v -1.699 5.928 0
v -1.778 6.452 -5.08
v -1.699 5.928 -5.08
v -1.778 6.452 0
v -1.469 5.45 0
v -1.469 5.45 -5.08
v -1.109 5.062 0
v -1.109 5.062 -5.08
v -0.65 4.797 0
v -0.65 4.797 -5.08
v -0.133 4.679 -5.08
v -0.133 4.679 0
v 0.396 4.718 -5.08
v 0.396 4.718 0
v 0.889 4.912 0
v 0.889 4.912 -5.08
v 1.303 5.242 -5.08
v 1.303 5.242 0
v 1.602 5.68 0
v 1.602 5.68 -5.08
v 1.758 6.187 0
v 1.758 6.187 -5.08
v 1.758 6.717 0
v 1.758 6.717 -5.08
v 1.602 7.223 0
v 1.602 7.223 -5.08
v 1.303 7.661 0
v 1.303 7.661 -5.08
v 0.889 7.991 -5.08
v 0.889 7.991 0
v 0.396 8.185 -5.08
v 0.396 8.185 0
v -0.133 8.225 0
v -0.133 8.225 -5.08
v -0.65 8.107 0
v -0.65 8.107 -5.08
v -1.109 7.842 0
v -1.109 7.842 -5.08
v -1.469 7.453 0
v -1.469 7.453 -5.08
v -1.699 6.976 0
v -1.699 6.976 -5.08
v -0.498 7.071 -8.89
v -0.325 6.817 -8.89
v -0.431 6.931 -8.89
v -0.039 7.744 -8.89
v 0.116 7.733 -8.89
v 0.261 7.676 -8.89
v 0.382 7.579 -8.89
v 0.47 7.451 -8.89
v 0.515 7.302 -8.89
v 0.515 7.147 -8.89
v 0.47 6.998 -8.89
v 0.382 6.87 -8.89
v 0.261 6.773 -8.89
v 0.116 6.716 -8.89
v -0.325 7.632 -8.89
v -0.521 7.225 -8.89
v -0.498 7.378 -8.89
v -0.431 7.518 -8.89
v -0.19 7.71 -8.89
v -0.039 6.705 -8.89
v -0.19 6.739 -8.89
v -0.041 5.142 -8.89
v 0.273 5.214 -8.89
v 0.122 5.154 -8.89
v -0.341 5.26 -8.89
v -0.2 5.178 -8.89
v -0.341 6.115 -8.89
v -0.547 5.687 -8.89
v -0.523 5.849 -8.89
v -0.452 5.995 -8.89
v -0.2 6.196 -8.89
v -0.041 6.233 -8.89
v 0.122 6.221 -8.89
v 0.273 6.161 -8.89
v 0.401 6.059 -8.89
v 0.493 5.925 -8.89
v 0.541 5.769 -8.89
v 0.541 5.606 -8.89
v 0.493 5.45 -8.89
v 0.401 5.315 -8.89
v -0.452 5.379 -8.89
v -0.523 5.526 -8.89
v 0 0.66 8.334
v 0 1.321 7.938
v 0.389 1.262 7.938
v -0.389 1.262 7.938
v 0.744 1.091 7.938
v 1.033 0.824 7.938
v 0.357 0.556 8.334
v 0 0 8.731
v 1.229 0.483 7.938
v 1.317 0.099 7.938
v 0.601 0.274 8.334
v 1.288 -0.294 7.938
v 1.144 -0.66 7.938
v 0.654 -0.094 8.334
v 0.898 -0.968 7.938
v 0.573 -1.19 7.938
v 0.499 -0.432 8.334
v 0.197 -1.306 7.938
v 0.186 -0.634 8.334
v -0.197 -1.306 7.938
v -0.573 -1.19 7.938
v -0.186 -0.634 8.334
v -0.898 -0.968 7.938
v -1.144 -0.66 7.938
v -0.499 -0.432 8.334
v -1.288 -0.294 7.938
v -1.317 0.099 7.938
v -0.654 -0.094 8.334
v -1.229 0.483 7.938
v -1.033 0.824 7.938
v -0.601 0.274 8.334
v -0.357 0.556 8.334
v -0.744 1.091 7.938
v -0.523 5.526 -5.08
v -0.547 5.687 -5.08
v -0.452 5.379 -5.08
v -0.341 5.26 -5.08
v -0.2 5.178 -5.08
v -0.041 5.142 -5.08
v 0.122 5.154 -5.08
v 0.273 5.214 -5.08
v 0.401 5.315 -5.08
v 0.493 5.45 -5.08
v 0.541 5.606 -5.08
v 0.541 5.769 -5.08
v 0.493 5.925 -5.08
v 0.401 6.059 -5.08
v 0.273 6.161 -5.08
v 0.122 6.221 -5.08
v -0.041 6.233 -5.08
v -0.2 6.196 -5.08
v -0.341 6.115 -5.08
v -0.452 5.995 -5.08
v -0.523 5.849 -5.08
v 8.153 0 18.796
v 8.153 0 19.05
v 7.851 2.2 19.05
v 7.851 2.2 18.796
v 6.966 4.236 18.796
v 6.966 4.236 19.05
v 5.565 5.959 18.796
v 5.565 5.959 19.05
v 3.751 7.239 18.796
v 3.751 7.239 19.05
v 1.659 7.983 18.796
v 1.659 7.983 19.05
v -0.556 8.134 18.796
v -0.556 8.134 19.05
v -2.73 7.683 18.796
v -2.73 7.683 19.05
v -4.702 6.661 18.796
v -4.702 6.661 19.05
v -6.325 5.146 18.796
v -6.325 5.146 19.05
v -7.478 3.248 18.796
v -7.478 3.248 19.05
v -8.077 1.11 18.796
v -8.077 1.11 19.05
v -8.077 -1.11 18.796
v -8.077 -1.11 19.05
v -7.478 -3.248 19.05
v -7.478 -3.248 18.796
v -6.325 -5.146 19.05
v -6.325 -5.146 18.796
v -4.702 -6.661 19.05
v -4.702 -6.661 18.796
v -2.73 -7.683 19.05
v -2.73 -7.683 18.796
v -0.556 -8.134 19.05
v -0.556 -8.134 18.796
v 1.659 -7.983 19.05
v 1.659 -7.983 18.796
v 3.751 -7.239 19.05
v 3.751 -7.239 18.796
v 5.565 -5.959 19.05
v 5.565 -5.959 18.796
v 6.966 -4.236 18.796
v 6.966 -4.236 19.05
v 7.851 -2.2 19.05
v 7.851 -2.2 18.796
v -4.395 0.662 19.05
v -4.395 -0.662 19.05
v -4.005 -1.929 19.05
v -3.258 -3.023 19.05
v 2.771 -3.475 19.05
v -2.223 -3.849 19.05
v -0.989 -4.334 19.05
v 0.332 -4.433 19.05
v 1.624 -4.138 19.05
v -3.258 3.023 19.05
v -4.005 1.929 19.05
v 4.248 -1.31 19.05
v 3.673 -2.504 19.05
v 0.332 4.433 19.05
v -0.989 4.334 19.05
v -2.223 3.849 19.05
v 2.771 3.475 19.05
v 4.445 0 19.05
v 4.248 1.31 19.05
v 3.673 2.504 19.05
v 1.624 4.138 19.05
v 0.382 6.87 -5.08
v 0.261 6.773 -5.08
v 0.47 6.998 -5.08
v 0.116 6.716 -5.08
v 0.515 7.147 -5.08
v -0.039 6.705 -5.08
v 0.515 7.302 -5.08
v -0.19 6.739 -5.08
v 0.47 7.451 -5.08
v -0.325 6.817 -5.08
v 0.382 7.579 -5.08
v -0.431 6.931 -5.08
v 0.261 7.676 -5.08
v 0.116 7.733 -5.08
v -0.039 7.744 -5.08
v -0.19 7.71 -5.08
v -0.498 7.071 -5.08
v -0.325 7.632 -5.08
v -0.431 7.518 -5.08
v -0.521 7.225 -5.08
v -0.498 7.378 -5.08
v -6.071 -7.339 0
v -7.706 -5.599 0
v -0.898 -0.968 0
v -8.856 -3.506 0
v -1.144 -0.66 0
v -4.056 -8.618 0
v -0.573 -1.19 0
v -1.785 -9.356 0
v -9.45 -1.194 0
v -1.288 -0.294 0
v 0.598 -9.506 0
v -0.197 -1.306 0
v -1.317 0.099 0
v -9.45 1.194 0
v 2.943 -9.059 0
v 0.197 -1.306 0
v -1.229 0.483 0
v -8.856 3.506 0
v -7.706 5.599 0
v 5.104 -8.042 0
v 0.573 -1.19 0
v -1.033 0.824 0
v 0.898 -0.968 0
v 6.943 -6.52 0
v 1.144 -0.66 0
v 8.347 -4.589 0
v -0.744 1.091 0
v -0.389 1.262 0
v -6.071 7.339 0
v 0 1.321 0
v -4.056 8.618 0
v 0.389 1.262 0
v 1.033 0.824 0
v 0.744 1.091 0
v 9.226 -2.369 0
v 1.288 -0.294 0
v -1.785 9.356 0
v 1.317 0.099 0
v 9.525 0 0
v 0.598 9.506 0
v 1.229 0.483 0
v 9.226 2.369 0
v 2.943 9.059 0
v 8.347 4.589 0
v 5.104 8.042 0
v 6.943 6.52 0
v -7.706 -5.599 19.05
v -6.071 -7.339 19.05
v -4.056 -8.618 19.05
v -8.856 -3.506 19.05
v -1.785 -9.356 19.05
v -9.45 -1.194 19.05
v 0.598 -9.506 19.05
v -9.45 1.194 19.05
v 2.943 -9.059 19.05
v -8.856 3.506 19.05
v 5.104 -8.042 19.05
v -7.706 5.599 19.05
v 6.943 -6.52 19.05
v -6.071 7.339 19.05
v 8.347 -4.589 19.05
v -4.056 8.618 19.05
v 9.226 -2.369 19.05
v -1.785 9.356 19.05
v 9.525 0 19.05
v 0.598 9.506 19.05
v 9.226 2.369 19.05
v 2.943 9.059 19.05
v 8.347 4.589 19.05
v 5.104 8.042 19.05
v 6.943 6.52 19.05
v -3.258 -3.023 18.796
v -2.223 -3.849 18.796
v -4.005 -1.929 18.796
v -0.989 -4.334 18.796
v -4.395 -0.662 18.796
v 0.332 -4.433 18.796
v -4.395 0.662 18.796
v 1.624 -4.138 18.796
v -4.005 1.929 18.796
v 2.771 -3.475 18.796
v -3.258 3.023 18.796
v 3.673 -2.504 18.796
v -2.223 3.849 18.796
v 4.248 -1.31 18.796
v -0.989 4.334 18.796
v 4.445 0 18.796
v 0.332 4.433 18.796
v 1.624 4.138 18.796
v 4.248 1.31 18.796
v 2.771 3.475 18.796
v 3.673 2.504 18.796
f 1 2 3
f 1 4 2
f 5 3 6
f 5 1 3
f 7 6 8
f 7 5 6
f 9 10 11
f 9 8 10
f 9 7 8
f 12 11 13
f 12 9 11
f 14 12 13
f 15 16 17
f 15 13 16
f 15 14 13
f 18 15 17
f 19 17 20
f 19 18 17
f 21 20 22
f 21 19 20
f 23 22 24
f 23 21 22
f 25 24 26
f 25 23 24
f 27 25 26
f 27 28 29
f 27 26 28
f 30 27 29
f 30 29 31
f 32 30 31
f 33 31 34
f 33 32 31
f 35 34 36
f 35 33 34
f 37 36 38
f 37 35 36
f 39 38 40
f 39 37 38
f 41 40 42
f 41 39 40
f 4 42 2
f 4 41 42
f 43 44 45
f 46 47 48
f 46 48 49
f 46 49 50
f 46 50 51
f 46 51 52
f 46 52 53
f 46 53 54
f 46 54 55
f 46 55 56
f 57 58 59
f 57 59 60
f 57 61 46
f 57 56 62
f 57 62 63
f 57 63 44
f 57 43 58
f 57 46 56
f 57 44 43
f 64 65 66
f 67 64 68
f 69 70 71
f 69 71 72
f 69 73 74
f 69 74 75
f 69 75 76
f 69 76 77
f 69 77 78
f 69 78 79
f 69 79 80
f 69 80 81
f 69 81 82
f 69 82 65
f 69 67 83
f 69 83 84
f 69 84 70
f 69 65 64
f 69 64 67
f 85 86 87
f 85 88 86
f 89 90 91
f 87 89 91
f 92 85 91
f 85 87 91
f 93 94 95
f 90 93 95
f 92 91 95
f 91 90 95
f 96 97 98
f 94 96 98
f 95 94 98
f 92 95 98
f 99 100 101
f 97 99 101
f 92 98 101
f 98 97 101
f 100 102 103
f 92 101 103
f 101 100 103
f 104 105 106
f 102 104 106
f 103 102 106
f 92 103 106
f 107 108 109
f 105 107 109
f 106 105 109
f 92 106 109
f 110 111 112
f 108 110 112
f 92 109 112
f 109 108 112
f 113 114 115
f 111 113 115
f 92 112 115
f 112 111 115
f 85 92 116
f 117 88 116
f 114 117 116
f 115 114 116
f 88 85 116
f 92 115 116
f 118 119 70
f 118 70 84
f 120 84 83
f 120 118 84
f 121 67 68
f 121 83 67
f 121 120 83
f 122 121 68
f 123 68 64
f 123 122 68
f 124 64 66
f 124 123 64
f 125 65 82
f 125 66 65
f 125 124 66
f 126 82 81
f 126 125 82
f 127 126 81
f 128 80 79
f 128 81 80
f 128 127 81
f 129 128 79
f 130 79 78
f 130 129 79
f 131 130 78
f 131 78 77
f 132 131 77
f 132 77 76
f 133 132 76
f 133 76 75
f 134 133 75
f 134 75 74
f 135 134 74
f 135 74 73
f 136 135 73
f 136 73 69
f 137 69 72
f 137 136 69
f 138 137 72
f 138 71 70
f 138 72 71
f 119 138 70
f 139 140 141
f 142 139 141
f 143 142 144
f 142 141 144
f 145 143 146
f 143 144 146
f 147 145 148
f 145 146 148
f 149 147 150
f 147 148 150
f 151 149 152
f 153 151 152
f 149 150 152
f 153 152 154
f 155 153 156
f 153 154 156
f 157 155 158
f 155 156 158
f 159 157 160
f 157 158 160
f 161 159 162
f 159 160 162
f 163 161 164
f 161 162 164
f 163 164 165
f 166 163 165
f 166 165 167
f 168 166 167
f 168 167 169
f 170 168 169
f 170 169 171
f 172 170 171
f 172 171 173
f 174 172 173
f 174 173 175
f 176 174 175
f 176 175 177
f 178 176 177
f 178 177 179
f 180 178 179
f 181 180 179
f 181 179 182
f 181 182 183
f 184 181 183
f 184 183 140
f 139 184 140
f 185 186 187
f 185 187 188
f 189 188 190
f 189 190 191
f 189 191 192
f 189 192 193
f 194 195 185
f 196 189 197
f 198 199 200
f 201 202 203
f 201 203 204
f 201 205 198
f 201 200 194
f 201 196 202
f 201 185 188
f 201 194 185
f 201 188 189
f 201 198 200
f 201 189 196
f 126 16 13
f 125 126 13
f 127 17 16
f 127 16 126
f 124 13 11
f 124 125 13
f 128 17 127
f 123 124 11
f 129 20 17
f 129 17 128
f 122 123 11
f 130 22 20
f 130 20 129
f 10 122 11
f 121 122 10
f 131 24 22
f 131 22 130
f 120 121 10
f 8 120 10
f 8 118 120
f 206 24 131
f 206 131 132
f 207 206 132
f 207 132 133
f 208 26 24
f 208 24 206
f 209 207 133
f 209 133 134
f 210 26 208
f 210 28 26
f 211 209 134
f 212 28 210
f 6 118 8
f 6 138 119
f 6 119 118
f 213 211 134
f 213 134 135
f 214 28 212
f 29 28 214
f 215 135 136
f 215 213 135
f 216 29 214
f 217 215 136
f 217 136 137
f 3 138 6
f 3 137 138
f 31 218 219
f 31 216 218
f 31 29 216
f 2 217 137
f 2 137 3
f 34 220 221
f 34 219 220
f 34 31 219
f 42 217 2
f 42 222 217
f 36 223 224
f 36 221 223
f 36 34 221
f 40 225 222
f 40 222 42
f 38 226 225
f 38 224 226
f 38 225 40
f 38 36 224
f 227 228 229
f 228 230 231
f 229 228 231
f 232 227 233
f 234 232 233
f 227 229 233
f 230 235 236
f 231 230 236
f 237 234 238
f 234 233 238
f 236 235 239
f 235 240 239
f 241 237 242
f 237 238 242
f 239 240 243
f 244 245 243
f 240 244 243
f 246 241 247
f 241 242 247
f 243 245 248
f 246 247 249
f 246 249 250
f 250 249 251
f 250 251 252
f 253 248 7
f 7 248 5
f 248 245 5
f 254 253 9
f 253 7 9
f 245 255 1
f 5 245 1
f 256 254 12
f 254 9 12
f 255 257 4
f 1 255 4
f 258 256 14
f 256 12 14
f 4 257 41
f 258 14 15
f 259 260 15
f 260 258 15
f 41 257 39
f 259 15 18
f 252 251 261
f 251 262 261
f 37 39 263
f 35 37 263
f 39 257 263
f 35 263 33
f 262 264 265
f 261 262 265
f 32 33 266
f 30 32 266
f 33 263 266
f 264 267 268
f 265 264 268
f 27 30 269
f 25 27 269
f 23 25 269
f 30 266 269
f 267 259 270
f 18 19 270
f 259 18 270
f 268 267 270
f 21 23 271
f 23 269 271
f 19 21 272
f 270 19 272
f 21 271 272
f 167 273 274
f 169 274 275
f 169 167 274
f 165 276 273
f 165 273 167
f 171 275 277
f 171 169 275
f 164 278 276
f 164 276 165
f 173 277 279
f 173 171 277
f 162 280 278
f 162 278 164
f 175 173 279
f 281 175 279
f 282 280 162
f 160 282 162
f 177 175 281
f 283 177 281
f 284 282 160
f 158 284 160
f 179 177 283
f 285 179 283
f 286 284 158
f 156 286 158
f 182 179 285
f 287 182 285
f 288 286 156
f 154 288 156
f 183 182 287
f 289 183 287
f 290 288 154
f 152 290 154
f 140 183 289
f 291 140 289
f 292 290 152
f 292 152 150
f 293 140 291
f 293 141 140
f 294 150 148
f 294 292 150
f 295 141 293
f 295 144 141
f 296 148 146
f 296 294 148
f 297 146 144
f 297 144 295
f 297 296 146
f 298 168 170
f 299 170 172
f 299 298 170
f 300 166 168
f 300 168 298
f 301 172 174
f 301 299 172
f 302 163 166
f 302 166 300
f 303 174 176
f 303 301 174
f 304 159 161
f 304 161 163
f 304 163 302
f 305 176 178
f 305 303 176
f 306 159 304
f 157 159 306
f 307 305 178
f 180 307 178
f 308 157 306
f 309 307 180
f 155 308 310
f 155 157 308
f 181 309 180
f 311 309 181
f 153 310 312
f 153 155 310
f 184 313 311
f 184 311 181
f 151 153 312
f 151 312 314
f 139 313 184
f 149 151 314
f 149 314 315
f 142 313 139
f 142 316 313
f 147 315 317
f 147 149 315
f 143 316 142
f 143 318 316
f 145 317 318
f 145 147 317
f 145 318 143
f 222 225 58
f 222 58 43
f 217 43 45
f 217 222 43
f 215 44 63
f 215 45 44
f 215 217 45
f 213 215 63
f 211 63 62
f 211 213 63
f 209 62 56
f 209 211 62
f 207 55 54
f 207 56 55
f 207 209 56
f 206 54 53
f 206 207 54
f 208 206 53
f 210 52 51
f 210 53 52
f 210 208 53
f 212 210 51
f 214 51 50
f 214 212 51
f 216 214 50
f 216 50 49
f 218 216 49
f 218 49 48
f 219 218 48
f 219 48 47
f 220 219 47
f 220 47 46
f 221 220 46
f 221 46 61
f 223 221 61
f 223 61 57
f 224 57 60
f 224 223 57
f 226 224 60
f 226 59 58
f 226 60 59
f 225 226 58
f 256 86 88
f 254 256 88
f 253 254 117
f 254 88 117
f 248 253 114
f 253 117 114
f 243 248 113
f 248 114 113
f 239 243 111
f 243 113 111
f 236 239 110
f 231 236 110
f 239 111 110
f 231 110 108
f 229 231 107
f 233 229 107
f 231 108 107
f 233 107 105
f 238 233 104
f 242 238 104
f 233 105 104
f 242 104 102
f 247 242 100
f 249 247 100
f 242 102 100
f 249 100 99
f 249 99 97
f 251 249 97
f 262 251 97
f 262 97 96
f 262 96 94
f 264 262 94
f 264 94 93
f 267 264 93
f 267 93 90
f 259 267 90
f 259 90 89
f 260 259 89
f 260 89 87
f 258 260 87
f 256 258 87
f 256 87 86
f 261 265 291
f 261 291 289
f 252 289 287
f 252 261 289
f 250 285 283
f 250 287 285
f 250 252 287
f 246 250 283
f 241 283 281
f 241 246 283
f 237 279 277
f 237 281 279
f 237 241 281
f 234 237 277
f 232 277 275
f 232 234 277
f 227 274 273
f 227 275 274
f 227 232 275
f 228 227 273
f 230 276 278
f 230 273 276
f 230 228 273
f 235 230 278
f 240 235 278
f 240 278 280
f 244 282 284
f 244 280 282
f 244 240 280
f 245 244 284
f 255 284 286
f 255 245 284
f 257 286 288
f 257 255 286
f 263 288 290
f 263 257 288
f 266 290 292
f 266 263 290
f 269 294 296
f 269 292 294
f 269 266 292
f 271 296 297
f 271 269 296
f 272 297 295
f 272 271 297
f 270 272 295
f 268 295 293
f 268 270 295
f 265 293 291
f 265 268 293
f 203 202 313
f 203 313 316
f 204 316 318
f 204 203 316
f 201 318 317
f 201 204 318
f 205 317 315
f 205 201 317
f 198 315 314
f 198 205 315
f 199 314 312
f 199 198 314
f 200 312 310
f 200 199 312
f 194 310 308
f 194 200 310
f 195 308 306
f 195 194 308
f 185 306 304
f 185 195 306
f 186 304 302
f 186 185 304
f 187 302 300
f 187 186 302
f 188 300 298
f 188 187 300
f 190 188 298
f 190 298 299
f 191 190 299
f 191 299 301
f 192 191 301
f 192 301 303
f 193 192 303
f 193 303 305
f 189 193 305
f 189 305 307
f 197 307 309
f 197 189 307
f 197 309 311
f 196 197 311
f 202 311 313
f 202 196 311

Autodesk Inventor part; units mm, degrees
ref_plane "YZ Plane" through (0, 0, 0) normal (1, 0, 0) x (0, 1, 0)
ref_plane "XZ Plane" through (0, 0, 0) normal (0, 1, 0) x (-1, 0, 0)
ref_plane "XY Plane" through (0, 0, 0) normal (0, 0, 1) x (1, 0, 0)
sketch "Sketch1" plane through (0, 0, 0) normal (0, 0, 1) x (1, 0, 0)
  circle A0 centre (0, 0) radius 9.525
  dimension "d0" = 19.05
extrude "Extrusion1" add sketch "Sketch1" along normal blind 19.05
sketch "Sketch2" plane through (0, 0, 19.05) normal (0, 0, 1) x (1, 0, 0)
  circle A0 centre (0, 0) radius 8.1534
  circle A1 centre (0, 0) radius 4.445
  circle A2 centre (0, 0) radius 9.525 projected
  dimension "d3" = 8.89
  dimension "d4" = 1.3716
extrude "Extrusion2" cut sketch "Sketch2" against normal blind 0.254 contours A0
hole "Hole1" at (0, 0, 0) direction (0, 0, 1) diameter 2.6416 depth 7.9375 tip angle 118 thread size "6-32 UNC" class "2B" standard "ANSI Unified Screw Threads"
sketch "Sketch3" plane through (0, 0, 0) normal (0, 0, -1) x (-1, 0, 0)
  circle A0 centre (0, 6.4516) radius 1.778
  circle A1 centre (0, 0) radius 9.525 projected
  circle A2 centre (0, 7.2136) radius 0.5461
  circle A3 centre (0, 5.6896) radius 0.5461
  dimension "d16" = 6.4516
  dimension "d17" = 3.556
  dimension "d20" = 1.0922
  dimension "d21" = 0.762
  dimension "d22" = 0.762
extrude "Extrusion3" add sketch "Sketch3" along normal blind 5.08 contours A0 | A2 | A3
sketch "Sketch4" plane through (0, 6.4516, -5.08) normal (0, 0, -1) x (-1, 0, 0)
  circle A0 centre (0, 0.773) radius 0.5212
  circle A1 centre (0, -0.7642) radius 0.5469
  point P0 (0, -6.4516)
extrude "Extrusion4" add sketch "Sketch4" along normal blind 3.81
properties part number "CE-075-12C"
